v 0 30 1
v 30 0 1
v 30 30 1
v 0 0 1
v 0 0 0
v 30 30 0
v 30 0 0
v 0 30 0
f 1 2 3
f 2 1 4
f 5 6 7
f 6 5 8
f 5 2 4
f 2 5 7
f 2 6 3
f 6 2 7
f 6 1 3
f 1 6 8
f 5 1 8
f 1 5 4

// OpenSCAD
/**
 * A way to test the fit of nut and bolt print measurements
 *
 * 2019-09-03: costmo
 * https://github.com/appideasDOTcom/3dPrinterModels
 * https://appideas.com/blog
**/

// Render quality settings.
$fa = 3;
$fs = 0.2;

baseXDimension = 30;
baseYDimension = 30;
baseHeight = 1.0;

nutTrapHeight = 3;
nutTrapWidth = 1.6;


base();


module base()
{
    cube( [baseXDimension, baseYDimension, baseHeight] );
}

module m4()
{

}

module m5()
{

}

module makeText( input, fontSize, fontHeight )
{
	font = "monaco";

	linear_extrude( height = fontHeight, twist = 0, center = false )
	{
		text( input, font = font, size = (fontSize * 1) );
	}
}
